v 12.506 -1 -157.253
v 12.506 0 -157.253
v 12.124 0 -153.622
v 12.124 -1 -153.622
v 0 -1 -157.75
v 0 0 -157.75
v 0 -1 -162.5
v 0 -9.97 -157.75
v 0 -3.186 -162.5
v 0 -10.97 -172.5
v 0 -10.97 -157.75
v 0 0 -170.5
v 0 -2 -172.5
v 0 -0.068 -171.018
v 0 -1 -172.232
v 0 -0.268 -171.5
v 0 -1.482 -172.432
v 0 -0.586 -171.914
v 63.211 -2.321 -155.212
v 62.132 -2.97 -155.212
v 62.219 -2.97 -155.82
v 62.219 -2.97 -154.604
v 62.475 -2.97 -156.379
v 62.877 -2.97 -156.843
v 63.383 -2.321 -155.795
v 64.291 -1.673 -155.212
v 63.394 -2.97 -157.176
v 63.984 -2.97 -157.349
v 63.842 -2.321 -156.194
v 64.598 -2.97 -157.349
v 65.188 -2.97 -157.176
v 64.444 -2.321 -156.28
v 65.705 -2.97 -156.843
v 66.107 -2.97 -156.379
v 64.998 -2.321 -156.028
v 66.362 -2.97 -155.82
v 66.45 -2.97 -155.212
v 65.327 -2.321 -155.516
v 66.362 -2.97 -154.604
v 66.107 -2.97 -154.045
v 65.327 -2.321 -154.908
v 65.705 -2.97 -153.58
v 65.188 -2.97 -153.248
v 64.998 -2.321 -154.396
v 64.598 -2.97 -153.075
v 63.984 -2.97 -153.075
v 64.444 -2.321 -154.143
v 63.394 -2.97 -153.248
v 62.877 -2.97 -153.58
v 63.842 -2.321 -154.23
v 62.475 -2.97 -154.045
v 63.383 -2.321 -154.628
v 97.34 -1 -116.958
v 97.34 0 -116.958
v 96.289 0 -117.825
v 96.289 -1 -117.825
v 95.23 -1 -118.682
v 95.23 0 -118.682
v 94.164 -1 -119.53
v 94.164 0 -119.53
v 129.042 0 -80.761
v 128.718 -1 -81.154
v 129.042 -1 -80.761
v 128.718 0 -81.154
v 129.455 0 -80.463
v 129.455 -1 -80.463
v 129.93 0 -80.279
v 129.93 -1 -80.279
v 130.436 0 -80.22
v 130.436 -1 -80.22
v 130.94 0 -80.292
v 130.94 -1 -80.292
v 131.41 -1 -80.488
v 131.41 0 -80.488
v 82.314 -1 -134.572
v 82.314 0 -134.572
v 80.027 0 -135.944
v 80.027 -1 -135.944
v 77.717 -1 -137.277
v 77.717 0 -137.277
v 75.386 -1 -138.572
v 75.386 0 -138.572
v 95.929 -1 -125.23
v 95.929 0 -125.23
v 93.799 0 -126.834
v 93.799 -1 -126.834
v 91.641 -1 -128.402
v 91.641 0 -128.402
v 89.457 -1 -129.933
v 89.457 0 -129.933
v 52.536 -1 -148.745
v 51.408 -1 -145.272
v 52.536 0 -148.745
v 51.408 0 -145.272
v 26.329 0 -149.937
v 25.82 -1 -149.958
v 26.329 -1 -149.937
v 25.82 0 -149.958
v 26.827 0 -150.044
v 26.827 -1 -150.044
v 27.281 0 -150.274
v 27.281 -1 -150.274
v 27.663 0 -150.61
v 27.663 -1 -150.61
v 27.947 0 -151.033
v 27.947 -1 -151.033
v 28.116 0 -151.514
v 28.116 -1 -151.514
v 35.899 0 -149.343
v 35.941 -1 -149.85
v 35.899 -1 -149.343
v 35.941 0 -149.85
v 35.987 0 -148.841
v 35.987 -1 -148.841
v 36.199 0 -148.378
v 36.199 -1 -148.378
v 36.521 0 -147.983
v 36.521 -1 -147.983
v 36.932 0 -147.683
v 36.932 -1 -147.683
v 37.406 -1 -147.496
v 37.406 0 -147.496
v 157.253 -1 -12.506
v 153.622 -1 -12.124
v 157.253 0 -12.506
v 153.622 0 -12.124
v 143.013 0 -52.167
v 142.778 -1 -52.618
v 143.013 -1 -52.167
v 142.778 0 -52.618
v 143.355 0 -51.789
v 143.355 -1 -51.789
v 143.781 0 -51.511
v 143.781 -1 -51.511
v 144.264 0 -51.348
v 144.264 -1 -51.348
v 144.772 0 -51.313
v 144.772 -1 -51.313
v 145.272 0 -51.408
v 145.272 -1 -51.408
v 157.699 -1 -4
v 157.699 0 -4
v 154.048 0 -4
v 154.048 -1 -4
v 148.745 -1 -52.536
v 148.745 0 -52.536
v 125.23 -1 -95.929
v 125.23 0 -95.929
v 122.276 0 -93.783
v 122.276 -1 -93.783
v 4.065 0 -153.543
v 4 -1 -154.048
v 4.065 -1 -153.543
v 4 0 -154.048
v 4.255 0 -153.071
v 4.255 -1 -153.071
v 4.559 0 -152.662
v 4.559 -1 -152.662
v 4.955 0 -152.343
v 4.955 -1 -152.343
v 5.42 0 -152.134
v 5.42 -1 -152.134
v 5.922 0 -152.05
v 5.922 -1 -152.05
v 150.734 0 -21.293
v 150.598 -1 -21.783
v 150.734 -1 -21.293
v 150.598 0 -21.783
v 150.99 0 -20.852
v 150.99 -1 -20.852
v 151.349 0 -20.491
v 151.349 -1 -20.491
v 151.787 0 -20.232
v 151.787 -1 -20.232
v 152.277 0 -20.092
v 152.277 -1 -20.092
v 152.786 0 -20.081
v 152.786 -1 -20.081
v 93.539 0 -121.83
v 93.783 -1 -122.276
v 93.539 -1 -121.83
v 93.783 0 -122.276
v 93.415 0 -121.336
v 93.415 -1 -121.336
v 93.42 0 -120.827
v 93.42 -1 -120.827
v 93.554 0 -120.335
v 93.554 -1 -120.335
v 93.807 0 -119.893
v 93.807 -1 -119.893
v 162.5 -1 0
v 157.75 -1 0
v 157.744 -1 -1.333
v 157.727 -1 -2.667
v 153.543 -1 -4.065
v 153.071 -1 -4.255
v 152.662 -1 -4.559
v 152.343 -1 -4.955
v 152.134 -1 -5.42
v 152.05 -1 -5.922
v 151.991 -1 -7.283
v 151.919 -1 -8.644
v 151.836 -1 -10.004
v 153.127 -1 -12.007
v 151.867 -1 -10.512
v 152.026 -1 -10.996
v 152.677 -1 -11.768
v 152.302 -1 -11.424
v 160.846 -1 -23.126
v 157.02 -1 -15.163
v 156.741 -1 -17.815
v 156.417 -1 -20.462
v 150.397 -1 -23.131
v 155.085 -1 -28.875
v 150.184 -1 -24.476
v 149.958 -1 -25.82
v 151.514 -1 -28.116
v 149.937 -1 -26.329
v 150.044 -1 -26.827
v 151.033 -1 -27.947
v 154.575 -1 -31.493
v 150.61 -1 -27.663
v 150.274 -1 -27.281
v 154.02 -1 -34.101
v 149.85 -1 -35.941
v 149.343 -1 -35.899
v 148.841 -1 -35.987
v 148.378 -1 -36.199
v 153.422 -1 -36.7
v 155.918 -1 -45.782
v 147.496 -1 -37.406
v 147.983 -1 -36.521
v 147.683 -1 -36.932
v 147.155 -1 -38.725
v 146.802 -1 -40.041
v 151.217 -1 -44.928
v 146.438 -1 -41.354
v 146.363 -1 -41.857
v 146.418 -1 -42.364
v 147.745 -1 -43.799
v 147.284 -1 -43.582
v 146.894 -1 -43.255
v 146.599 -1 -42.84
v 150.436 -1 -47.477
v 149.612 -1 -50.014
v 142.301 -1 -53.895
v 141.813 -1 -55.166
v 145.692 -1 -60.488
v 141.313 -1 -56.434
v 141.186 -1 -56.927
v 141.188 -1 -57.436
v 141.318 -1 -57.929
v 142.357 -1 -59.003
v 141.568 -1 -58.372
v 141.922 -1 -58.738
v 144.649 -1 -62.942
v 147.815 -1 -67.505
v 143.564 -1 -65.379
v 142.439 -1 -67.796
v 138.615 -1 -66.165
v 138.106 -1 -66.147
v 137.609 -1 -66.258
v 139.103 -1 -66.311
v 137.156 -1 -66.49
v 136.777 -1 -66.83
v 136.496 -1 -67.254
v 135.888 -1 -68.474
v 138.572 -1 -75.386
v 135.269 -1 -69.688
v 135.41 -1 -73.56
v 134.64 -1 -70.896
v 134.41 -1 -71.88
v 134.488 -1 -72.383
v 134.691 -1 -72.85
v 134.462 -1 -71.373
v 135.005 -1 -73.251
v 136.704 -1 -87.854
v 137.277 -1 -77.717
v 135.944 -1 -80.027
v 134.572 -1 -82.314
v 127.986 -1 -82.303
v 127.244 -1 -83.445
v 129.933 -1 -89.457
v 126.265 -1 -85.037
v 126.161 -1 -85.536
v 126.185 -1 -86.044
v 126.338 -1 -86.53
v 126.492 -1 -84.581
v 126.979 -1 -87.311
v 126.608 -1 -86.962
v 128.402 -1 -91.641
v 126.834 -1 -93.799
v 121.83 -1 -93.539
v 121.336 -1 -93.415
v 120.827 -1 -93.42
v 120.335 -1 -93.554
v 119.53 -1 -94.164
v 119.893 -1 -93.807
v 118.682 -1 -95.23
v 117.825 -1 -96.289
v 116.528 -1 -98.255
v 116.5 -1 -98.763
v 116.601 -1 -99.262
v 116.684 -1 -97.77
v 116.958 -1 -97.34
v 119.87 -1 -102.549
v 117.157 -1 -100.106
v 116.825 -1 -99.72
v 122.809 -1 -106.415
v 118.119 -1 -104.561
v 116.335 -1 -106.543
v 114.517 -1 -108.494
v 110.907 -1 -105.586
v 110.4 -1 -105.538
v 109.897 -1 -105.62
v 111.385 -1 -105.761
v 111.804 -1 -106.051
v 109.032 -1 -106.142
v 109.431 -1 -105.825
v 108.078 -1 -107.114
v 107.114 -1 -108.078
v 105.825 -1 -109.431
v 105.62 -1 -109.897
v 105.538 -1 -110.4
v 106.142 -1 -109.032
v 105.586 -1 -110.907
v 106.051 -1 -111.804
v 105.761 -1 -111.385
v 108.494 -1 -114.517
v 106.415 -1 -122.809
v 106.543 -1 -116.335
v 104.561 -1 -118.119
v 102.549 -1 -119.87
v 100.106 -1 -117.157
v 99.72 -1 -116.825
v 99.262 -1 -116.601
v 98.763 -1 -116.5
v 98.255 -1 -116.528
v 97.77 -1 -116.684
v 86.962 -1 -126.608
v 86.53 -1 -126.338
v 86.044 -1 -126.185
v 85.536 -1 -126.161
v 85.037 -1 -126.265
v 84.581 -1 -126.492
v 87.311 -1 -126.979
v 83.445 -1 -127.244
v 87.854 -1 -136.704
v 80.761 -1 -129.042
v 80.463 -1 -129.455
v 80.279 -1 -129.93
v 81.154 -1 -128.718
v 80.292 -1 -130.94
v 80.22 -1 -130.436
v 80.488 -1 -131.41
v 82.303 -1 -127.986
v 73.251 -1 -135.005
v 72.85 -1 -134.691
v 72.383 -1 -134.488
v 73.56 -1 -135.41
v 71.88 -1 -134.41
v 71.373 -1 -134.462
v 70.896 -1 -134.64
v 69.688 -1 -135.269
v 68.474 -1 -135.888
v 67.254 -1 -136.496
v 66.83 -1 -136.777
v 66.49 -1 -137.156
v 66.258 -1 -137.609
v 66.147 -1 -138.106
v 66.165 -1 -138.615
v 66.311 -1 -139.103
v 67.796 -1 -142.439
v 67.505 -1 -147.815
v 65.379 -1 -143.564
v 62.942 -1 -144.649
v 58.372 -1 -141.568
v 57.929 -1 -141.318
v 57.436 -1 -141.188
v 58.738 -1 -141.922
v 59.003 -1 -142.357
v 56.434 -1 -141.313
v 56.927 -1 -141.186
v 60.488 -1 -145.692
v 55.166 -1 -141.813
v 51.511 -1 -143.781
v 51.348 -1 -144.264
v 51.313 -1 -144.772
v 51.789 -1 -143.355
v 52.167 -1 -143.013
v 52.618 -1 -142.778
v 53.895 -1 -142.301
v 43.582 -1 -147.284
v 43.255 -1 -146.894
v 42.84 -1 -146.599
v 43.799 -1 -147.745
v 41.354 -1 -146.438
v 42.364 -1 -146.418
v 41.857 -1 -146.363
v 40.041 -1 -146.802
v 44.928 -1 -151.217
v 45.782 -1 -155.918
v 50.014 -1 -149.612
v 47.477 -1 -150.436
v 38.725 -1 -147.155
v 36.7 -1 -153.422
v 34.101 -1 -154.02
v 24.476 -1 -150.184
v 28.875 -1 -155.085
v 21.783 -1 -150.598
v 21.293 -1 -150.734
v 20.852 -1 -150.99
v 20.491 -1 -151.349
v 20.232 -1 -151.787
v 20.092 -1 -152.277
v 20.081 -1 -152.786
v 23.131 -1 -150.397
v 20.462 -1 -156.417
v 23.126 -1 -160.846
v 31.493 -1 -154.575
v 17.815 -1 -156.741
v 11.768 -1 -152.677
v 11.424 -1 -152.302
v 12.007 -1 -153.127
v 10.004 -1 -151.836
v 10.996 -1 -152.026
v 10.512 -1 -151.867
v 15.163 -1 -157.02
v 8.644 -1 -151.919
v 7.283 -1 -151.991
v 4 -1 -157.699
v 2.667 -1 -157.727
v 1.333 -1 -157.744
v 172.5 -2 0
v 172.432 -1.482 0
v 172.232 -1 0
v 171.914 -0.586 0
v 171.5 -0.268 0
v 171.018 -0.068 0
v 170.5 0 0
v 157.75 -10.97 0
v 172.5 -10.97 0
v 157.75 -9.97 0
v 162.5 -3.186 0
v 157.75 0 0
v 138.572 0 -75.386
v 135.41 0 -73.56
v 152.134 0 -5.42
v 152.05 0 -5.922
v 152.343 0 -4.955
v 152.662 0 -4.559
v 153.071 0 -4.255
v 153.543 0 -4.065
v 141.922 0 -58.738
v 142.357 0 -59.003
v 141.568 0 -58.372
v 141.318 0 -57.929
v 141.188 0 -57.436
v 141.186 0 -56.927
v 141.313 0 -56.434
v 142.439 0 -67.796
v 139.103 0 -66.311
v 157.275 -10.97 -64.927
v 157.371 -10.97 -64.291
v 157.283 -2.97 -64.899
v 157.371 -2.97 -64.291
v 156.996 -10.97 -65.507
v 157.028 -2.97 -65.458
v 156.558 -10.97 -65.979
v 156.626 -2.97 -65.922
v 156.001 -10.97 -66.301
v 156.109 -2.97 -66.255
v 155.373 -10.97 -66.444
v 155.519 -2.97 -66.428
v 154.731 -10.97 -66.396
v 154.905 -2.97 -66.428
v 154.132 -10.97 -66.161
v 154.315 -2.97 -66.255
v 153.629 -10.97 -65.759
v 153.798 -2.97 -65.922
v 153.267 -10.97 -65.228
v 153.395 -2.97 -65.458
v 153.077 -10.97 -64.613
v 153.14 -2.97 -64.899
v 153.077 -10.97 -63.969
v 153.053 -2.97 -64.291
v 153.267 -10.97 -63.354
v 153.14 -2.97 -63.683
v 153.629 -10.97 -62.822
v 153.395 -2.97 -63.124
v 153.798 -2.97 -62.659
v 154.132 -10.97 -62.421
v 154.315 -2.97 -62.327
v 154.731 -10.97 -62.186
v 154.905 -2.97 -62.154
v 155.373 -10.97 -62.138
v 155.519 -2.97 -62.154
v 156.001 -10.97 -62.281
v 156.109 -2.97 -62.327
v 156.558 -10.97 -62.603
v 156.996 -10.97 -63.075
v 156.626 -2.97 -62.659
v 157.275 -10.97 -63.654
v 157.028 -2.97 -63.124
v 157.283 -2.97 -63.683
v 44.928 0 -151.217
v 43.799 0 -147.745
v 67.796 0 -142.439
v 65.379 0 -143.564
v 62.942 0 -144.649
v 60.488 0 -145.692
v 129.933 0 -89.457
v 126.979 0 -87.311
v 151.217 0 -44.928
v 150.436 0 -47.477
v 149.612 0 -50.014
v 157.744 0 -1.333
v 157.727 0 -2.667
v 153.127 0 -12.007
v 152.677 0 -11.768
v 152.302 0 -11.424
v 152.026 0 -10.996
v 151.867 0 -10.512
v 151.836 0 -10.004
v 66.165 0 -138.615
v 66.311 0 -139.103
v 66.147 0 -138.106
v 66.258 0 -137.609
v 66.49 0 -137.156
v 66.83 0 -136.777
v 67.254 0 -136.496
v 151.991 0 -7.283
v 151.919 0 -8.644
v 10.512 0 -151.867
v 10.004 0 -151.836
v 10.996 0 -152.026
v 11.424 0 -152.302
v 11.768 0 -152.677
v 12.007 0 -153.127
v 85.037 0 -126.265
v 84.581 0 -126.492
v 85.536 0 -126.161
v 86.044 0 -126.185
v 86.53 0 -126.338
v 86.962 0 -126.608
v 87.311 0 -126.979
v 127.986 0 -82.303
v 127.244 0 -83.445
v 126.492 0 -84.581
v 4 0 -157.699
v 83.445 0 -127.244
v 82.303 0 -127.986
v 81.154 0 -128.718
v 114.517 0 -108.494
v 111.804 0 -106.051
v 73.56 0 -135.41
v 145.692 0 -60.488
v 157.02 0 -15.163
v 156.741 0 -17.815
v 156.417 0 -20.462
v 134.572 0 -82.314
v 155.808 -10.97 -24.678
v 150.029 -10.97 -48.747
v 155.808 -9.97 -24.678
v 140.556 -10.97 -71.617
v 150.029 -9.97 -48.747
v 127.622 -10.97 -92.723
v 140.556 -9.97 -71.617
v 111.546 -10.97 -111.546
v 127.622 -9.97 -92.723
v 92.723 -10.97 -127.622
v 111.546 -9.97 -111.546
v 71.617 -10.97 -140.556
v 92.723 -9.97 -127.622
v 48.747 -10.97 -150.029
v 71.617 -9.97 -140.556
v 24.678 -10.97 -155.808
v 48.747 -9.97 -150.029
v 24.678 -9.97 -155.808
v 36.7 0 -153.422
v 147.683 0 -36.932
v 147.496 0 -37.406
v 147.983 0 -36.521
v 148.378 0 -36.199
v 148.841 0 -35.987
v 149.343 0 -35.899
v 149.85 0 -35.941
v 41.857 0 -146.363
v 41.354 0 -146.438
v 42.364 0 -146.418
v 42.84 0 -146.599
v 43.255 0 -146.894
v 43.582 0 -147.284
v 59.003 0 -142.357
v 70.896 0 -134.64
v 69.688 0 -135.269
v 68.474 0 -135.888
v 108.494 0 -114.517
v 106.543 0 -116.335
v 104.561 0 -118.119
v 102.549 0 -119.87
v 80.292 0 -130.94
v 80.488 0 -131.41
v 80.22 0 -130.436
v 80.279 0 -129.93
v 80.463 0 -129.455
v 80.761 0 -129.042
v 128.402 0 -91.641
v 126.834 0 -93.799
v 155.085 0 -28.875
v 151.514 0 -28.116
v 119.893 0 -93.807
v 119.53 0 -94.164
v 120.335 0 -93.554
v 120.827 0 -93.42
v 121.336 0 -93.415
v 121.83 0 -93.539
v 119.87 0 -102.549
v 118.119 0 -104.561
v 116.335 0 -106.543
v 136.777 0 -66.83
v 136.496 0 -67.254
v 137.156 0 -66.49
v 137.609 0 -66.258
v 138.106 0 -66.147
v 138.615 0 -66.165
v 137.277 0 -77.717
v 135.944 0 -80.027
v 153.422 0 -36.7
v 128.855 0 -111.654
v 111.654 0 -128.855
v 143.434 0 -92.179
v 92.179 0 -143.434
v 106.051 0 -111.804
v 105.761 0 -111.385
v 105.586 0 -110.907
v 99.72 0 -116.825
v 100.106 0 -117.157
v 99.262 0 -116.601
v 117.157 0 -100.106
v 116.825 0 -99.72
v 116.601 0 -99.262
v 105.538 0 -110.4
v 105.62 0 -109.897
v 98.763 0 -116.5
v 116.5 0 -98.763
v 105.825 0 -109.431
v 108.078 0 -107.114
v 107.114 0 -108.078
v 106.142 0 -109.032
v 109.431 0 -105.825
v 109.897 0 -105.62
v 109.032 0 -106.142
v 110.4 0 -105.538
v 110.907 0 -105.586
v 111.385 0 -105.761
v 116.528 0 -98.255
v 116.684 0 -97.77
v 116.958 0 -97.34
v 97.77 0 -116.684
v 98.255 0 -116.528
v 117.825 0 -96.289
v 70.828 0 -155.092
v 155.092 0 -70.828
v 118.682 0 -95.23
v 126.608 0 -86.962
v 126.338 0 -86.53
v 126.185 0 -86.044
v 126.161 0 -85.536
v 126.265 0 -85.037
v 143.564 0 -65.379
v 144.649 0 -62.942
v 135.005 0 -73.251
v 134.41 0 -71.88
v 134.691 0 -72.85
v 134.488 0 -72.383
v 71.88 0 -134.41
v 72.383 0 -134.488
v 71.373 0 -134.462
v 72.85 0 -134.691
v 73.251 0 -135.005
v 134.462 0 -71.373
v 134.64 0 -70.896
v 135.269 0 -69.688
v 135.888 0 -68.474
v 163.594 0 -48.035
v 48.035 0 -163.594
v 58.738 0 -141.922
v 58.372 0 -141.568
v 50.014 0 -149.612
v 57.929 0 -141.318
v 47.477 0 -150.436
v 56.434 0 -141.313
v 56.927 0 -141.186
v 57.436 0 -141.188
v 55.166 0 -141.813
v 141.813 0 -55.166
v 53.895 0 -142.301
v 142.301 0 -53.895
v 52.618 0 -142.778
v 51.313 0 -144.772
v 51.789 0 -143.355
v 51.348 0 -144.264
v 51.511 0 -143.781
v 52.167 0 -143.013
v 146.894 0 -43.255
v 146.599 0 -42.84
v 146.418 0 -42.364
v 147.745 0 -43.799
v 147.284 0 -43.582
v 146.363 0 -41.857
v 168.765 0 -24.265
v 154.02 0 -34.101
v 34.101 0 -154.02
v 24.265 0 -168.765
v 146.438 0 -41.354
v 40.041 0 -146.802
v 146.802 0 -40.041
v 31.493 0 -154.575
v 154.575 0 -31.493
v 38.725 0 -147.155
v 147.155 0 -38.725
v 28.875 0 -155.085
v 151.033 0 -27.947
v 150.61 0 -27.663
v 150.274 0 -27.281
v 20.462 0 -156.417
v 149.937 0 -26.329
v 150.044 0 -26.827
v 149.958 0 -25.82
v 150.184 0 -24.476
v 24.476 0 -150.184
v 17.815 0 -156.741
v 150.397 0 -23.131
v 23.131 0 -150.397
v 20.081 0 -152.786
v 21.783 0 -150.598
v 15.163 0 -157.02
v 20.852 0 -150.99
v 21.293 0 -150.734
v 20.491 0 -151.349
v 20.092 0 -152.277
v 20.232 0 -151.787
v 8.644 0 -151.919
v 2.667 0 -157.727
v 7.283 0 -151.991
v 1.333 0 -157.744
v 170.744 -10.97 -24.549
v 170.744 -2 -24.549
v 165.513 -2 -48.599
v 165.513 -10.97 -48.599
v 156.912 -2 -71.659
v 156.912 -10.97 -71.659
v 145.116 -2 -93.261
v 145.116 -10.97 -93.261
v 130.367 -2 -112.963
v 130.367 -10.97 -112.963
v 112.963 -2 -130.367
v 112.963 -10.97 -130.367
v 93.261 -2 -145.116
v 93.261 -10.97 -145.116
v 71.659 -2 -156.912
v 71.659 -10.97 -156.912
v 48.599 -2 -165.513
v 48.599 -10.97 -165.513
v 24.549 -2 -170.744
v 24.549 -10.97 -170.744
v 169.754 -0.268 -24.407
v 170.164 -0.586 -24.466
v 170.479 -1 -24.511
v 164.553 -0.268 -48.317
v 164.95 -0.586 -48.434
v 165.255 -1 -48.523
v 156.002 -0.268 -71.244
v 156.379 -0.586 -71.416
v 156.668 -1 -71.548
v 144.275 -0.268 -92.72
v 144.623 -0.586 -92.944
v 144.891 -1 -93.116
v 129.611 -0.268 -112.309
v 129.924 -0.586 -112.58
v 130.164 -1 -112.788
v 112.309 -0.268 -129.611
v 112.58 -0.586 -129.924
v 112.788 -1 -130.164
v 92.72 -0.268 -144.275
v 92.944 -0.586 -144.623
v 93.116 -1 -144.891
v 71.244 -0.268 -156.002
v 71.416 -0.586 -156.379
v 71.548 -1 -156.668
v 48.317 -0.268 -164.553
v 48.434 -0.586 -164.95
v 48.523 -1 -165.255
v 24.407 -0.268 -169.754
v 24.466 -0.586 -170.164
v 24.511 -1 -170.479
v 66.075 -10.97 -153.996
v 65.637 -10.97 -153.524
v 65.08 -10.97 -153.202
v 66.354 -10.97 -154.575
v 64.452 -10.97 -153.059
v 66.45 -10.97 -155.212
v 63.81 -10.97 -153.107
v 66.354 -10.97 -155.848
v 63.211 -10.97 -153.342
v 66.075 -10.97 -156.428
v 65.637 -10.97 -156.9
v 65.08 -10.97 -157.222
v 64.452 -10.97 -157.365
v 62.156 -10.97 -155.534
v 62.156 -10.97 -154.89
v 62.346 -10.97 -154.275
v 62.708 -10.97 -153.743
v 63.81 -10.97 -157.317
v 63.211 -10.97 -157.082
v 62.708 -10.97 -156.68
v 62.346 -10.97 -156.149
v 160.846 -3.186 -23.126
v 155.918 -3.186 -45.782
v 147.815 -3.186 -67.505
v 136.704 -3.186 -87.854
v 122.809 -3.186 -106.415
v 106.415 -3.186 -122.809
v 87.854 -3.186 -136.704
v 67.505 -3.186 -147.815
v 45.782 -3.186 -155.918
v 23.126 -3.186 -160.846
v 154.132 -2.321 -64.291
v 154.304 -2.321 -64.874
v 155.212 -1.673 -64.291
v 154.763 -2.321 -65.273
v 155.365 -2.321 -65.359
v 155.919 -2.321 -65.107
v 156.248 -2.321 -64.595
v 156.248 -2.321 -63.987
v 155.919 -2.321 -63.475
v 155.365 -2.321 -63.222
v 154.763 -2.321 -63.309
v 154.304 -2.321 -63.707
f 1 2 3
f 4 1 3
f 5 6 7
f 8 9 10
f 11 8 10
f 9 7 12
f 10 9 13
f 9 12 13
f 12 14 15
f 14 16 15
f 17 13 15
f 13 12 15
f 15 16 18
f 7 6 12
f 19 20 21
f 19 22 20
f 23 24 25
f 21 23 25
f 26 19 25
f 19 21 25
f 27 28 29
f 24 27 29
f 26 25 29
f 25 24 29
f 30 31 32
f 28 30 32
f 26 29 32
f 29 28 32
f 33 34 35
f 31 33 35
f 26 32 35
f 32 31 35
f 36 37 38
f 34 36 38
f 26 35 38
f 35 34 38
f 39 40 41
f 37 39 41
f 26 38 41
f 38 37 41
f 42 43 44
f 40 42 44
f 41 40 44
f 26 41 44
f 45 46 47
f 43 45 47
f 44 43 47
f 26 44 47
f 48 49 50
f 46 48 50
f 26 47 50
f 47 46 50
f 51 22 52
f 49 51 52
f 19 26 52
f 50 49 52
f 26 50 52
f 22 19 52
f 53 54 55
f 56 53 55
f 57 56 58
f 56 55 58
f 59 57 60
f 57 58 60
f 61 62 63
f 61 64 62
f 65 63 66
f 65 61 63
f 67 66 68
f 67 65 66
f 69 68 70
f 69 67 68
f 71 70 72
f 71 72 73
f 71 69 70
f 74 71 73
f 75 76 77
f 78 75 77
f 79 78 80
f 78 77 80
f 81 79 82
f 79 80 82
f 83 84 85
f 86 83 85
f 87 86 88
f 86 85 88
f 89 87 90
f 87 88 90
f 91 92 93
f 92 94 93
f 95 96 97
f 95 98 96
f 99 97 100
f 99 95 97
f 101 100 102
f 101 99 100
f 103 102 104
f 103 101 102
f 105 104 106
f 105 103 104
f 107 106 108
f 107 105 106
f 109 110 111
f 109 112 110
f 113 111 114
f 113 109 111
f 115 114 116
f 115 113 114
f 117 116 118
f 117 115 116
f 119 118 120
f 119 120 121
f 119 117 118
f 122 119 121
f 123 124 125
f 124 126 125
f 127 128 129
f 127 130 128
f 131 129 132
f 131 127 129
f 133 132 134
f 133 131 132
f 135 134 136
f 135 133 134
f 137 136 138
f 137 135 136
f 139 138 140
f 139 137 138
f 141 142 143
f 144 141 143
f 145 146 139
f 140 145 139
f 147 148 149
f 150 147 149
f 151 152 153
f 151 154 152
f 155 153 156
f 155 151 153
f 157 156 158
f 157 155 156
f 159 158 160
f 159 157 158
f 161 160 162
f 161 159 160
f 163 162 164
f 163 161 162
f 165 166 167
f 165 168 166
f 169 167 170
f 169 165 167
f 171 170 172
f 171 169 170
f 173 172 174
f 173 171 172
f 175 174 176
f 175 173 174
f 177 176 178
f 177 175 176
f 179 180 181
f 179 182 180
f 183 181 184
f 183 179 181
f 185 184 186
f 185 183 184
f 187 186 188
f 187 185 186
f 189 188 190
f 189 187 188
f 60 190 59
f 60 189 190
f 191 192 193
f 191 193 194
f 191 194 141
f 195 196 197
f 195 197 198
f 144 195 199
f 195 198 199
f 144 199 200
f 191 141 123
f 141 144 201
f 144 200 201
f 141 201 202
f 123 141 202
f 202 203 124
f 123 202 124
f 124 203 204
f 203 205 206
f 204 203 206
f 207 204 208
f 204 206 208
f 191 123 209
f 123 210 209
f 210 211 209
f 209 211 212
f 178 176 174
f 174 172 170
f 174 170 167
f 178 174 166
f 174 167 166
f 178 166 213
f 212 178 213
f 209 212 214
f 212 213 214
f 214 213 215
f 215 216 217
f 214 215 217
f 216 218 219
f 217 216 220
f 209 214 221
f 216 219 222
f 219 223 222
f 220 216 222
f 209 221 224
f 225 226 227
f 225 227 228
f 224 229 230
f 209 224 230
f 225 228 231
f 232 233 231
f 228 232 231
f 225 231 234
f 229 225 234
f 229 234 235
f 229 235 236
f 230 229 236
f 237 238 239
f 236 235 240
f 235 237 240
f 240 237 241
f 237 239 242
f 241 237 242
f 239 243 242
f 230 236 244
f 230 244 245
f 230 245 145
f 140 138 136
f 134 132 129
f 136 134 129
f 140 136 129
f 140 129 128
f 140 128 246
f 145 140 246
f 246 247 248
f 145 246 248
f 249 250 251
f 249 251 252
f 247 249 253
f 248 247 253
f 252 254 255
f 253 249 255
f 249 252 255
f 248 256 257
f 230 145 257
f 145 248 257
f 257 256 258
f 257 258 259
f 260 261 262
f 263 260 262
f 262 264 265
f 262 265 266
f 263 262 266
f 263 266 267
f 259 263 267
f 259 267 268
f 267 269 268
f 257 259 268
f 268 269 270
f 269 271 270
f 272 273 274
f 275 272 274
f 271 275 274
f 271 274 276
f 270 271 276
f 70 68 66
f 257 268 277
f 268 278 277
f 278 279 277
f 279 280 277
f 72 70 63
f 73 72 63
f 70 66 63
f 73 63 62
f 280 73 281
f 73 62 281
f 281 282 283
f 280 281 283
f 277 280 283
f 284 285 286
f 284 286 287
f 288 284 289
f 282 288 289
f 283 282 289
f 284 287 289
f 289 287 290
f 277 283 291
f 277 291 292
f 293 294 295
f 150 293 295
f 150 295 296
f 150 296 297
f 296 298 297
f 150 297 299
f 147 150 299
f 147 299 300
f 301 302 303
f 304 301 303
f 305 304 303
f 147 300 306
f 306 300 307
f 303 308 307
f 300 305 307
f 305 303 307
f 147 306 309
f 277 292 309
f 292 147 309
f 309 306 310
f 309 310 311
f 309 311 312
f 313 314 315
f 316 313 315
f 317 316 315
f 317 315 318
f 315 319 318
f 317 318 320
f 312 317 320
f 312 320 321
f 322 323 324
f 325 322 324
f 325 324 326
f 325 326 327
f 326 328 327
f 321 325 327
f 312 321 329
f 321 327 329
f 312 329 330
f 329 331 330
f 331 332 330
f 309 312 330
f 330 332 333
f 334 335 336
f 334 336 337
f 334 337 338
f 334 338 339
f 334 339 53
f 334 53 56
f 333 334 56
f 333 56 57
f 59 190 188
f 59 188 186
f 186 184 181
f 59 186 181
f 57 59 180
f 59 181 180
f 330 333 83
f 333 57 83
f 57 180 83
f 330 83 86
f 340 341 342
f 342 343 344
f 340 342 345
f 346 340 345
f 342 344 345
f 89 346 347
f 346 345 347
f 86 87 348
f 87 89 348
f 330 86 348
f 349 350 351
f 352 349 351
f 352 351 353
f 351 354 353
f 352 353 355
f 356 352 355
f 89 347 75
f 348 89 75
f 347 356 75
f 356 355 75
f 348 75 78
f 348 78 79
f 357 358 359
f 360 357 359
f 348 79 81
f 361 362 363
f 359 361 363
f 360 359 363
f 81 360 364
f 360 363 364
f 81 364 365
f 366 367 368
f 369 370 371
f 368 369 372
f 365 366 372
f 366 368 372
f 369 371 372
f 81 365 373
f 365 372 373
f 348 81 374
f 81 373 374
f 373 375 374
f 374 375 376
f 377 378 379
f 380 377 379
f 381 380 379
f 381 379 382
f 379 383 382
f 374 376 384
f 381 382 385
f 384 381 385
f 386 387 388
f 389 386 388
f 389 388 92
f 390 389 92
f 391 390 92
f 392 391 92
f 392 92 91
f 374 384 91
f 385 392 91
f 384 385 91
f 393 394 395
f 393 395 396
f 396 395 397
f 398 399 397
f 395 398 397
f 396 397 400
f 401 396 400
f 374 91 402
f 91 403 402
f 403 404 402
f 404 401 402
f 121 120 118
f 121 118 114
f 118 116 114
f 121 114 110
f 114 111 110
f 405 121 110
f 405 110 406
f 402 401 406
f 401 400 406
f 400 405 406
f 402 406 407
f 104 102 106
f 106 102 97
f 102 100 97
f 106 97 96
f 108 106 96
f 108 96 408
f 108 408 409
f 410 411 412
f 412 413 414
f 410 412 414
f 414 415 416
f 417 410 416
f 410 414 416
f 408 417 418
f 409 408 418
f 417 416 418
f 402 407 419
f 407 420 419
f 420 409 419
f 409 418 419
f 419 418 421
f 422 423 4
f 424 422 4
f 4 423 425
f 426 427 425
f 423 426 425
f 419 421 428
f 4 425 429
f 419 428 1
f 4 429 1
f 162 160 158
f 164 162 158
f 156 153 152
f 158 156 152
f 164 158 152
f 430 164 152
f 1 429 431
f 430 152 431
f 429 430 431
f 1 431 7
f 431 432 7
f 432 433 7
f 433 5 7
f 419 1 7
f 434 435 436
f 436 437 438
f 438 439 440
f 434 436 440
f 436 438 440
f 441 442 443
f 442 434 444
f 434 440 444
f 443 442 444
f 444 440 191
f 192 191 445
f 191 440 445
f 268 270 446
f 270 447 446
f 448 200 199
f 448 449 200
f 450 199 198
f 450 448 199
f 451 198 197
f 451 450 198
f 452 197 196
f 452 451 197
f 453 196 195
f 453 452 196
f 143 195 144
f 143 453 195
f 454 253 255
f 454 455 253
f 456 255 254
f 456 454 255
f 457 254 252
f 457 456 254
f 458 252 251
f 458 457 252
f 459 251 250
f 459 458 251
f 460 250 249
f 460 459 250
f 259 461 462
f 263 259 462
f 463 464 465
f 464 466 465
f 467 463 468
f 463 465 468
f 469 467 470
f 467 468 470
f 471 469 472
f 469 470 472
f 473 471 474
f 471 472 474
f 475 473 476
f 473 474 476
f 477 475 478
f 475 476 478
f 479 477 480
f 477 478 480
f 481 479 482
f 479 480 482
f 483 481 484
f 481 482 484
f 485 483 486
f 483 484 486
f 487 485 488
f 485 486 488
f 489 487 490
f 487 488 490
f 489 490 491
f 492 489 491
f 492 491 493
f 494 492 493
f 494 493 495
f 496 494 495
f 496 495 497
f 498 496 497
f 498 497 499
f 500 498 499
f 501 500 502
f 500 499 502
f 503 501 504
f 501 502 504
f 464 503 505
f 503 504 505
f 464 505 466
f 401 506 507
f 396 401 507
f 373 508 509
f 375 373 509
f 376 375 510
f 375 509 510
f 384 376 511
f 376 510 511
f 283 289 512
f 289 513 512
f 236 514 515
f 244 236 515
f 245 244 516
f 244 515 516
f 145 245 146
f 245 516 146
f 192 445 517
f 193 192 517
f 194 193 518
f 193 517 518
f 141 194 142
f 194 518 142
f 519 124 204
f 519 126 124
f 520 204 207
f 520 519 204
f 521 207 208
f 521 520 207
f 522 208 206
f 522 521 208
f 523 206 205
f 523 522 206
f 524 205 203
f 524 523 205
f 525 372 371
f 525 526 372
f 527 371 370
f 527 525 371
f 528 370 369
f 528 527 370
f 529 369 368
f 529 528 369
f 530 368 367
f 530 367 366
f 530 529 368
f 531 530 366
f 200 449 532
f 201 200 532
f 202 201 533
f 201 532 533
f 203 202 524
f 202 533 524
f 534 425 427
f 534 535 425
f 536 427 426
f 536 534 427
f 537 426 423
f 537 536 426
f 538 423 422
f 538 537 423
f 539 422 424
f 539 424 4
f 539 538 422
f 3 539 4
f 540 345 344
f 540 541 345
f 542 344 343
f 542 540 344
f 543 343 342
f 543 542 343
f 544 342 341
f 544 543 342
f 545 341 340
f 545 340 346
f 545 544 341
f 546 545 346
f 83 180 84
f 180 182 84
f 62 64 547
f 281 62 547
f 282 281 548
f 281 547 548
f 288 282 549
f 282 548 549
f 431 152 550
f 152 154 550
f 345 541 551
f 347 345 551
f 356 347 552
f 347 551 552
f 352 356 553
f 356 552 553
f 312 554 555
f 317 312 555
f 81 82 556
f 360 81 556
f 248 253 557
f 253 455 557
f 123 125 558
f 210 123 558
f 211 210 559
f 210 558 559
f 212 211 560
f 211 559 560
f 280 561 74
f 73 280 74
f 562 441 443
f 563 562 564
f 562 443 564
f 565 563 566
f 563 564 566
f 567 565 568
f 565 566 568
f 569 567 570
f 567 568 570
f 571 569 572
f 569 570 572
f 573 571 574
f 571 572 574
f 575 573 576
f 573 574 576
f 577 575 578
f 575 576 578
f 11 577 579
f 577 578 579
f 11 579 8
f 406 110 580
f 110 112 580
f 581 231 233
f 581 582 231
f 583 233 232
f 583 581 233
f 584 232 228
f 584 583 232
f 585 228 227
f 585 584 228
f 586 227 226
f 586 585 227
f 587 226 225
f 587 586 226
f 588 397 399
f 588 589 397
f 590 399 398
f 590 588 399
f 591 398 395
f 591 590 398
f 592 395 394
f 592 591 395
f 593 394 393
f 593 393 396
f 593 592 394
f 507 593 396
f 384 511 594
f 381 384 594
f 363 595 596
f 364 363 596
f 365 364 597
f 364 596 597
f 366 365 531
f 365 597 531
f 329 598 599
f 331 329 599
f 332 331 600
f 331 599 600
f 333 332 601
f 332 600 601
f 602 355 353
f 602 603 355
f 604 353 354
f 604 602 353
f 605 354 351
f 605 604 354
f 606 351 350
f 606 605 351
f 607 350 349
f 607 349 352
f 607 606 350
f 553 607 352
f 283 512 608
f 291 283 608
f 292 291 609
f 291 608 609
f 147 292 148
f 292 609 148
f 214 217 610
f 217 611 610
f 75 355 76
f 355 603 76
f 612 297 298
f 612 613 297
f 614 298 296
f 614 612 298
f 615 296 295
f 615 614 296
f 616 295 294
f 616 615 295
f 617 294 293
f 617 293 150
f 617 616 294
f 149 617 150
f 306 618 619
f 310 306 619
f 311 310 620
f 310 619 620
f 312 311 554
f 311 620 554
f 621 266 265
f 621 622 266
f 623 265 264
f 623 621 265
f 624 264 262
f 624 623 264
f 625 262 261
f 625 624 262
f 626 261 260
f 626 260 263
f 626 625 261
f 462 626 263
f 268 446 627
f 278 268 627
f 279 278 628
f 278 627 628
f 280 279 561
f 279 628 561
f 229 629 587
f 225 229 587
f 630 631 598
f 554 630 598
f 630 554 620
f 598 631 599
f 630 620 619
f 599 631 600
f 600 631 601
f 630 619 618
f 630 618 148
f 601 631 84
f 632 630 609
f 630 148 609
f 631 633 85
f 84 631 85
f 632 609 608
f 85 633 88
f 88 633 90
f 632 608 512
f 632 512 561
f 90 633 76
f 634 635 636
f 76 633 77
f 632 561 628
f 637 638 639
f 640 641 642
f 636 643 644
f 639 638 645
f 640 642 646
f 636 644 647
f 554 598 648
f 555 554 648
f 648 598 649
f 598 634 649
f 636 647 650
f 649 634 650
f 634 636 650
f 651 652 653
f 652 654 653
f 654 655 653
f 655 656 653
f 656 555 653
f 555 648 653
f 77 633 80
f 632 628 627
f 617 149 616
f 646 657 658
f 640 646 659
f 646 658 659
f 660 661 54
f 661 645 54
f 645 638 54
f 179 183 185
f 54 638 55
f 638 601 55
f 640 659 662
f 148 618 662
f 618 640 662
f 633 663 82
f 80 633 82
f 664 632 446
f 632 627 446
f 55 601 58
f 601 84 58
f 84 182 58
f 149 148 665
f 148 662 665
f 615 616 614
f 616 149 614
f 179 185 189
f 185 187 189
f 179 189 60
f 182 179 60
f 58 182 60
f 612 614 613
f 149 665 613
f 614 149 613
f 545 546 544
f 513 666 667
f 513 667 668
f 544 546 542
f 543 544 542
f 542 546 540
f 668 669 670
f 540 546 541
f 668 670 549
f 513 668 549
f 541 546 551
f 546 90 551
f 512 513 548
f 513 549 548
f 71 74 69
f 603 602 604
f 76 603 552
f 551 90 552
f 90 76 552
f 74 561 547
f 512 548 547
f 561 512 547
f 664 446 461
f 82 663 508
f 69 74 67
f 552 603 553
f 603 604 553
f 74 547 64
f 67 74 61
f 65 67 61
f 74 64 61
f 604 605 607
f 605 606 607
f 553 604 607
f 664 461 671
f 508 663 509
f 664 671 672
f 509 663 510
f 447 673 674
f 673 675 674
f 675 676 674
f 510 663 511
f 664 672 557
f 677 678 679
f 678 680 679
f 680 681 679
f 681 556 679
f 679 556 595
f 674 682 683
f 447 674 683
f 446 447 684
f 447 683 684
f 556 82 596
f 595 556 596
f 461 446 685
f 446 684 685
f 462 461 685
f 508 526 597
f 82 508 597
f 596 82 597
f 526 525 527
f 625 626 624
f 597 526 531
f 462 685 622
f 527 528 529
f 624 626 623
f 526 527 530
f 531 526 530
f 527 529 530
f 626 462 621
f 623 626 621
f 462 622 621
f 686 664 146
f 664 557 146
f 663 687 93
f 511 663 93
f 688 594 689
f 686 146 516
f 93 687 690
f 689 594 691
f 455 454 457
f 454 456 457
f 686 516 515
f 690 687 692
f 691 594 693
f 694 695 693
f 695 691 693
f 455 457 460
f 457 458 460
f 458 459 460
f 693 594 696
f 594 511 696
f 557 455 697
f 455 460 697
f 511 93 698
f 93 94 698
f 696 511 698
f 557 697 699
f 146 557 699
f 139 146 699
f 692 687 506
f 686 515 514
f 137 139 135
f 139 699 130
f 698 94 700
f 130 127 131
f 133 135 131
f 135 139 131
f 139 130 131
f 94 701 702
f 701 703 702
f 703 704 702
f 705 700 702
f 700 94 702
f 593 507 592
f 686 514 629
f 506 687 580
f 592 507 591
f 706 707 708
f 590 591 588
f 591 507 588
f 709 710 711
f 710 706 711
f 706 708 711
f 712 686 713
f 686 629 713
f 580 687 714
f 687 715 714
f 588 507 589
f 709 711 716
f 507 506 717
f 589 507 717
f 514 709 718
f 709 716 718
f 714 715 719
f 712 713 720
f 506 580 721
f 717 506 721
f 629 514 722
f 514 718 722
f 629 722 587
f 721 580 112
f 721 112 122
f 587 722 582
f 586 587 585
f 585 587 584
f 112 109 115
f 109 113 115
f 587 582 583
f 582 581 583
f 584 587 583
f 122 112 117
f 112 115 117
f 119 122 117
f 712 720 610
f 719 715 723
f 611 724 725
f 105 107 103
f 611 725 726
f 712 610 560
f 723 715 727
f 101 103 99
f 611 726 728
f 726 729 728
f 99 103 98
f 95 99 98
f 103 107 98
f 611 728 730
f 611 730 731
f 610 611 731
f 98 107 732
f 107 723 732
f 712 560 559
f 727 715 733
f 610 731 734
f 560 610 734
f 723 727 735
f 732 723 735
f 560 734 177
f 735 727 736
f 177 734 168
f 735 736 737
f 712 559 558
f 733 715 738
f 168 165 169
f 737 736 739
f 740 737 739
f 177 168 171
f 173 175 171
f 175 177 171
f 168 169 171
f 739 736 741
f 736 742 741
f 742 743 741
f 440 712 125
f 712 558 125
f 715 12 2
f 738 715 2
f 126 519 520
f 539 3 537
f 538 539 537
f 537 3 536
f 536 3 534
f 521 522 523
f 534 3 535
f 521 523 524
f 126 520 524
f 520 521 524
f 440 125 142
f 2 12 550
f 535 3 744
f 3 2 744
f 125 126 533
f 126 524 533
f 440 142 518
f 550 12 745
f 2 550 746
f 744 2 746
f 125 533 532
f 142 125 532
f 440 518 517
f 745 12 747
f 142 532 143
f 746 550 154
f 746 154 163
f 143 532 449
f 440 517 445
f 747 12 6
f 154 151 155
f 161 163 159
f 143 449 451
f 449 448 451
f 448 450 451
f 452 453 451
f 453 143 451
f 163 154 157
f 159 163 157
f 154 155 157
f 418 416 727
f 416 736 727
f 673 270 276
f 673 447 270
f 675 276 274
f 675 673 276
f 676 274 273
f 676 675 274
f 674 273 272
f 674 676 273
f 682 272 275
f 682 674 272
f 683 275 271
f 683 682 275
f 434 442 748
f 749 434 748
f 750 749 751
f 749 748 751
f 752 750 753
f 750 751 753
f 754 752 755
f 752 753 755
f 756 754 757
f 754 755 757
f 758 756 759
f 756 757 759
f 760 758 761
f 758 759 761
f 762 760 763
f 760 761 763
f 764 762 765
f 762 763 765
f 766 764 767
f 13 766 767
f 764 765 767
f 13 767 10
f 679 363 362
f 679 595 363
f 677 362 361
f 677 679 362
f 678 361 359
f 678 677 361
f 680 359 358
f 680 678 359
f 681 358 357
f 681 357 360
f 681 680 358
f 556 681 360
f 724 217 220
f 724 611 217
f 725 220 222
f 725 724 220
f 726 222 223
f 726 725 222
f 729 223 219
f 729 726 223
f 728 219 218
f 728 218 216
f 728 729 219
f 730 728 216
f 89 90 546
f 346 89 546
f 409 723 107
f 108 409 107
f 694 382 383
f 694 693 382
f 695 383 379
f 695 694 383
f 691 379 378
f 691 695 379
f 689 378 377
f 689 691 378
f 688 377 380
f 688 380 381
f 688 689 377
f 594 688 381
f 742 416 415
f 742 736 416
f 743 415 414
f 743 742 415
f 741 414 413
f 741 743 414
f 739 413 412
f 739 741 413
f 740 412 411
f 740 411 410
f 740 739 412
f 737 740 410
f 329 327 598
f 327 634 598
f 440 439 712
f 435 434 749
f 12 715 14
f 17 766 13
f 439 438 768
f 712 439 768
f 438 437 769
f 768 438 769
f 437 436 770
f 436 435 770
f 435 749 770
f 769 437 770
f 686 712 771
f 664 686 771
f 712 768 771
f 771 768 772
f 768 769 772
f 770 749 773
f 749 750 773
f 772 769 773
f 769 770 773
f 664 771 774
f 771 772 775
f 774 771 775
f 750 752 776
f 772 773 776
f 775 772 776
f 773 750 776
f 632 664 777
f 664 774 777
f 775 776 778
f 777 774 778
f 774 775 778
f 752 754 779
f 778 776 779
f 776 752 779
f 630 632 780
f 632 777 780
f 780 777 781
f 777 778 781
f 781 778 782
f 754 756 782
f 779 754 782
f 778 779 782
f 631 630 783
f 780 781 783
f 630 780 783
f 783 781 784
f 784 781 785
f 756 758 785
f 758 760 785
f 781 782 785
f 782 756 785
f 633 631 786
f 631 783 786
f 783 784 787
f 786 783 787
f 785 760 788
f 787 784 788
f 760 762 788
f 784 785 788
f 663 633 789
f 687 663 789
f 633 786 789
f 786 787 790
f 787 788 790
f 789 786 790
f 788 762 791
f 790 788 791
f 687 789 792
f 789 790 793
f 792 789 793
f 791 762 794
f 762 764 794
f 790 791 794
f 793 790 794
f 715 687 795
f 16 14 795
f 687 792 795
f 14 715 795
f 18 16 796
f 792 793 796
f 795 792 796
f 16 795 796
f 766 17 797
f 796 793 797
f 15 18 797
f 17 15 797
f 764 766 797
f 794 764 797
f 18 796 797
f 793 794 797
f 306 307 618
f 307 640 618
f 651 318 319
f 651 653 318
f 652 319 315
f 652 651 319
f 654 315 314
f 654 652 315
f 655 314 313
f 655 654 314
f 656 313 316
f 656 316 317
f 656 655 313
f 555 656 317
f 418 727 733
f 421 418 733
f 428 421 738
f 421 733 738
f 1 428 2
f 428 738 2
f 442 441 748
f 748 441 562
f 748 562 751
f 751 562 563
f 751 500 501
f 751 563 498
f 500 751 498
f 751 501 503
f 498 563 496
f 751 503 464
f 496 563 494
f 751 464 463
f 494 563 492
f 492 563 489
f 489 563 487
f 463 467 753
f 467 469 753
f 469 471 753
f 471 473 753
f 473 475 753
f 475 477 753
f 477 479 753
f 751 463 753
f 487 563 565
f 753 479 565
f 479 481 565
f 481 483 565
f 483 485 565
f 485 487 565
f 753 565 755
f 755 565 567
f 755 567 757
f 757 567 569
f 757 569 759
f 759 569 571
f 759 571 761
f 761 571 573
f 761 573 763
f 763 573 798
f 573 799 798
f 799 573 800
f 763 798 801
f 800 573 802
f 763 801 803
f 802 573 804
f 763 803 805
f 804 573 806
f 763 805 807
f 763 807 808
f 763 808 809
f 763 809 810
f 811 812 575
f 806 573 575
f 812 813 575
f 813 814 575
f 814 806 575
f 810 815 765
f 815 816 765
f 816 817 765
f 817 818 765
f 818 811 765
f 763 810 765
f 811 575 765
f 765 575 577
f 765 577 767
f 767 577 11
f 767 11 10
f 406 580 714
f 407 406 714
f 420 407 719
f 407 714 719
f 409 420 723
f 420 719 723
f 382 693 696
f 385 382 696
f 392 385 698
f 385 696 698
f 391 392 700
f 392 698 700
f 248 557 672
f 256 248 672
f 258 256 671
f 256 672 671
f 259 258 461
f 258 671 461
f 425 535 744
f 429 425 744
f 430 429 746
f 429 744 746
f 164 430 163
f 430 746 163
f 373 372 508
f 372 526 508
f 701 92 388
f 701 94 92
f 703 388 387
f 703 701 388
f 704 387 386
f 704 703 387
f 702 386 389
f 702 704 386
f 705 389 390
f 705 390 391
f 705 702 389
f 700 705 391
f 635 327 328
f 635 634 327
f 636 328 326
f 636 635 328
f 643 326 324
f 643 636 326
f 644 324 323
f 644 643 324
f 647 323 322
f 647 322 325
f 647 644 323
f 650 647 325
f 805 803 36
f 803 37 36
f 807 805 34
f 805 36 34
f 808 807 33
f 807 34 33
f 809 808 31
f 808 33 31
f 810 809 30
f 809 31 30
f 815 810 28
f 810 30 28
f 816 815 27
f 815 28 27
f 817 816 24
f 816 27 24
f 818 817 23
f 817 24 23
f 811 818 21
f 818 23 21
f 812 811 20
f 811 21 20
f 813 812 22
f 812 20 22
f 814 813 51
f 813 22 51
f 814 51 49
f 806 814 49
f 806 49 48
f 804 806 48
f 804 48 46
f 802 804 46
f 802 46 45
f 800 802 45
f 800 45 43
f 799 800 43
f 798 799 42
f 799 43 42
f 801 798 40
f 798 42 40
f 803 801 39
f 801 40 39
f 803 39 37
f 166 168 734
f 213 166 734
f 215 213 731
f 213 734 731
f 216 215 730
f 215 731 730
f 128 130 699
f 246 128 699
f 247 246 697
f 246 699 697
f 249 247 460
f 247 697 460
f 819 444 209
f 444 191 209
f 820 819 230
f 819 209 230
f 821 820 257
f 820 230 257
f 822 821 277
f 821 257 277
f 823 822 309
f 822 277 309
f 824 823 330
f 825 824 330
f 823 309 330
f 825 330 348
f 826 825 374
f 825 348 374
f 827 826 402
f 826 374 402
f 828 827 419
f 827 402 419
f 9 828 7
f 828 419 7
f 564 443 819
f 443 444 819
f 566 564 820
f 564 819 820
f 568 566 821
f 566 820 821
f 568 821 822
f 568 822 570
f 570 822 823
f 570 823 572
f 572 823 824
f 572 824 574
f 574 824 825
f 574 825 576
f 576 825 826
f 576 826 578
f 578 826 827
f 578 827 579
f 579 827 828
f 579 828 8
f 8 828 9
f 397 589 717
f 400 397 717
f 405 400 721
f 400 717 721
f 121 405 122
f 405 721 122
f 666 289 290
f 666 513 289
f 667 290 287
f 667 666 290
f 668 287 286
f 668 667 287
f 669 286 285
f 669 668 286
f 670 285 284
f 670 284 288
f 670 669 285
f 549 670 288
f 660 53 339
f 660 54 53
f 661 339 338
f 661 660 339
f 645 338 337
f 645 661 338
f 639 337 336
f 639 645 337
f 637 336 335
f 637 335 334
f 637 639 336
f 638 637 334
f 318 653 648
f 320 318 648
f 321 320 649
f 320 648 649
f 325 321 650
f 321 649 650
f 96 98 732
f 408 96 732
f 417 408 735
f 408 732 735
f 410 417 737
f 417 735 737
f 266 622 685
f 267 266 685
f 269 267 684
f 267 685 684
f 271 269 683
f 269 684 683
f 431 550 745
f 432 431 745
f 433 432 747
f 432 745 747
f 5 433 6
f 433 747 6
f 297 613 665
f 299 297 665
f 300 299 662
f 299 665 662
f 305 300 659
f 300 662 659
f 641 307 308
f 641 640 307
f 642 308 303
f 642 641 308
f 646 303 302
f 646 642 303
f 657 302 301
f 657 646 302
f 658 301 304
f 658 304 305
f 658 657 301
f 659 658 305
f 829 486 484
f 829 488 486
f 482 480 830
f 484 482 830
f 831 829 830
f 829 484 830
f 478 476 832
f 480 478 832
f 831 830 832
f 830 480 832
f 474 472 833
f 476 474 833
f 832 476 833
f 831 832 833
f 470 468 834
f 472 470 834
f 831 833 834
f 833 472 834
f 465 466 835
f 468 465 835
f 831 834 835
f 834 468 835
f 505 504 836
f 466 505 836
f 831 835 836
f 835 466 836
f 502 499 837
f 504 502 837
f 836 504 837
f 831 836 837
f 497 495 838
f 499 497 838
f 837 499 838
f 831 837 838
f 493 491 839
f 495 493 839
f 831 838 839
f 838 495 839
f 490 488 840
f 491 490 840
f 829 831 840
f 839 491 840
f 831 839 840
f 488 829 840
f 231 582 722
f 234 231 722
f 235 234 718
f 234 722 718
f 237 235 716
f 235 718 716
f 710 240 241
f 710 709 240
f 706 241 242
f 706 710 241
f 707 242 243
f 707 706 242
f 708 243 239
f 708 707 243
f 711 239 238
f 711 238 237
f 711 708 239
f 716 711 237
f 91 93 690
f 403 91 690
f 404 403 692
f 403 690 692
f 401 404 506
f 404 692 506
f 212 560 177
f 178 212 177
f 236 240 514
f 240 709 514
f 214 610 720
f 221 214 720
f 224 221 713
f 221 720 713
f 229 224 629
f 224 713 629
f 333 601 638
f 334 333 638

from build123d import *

# Parameters (mm, degrees)
CUT_EXTRUDE1_DEPTH             = 245.198363836
CIRPATTERN1_COUNT              = 60
CUT_EXTRUDE2_DEPTH             = 25.4
FILLET1_R                      = 2
F_6_0_204_DIAMETER_HOLE1_D     = 4.318
F_6_0_204_DIAMETER_HOLE1_DEPTH = 8
F_6_0_204_DIAMETER_HOLE1_TIP   = 1.297258076
FILLET2_R                      = 2


with BuildPart() as part:
    # Sketch1 → Revolve1 (revolve)
    with BuildSketch(Plane.XY, mode=Mode.PRIVATE) as revolve1_sk:
        Polygon((-157.75, -10.97), (-157.75, -9.97), (-162.5, -3.186296968), (-162.5, -1), (-152.165, -1), (-152.165, 0), (-172.5, 0), (-172.5, -10.97), align=None)
    revolve(revolve1_sk.sketch.rotate(Axis((0, 0, 0), (0, 1, 0)), 270), axis=Axis((0, 0, 0), (0, 1, 0)))

    # Sketch2 → Cut-Extrude1 (cut, symmetric)
    with BuildSketch(Plane(origin=(0, 0, 0), x_dir=(1, 0, 0), z_dir=(0, 1, 0))):
        with BuildLine():
            Line((-4, 150.699278692), (4, 150.699278692))
            Line((4, 150.699278692), (4, 157.699278692))
            ThreePointArc((4, 157.699278692), (0, 157.75), (-4, 157.699278692))
            Line((-4, 157.699278692), (-4, 150.699278692))
        make_face()
    cut_extrude1 = extrude(amount=CUT_EXTRUDE1_DEPTH, both=True, mode=Mode.SUBTRACT)

    # CirPattern1: Cut-Extrude1 ×60 about axis
    cirpattern1_axis = Axis((0, 0, 0), (0, 1, 0))
    for i in range(1, CIRPATTERN1_COUNT):
        add(cut_extrude1.rotate(cirpattern1_axis, i * 360 / CIRPATTERN1_COUNT), mode=Mode.SUBTRACT)

    # Sketch6 → Cut-Extrude2 (cut, symmetric)
    with BuildSketch(Plane(origin=(0, 0, 0), x_dir=(1, 0, 0), z_dir=(0, 1, 0))):
        with BuildLine():
            Line((0, 0), (0, 216.30546713))
            ThreePointArc((0, 216.30546713), (-152.951062615, -152.951062615), (216.30546713, 0))
            Line((216.30546713, 0), (0, 0))
        make_face()
    extrude(amount=CUT_EXTRUDE2_DEPTH, both=True, mode=Mode.SUBTRACT)

    # Fillet1
    fillet1_edges = [part.edges().sort_by_distance(p)[0] for p in [
        (4, -0.5, -152.112416406),
        (11.921989549, -0.5, -151.697242527),
        (27.713359286, -0.5, -149.620041913),
        (35.538540092, -0.5, -147.956748386),
        (43.20109566, -0.5, -145.90357281),
        (19.878164712, -0.5, -150.86101482),
        (50.80954779, -0.5, -143.431436855),
        (58.215511789, -0.5, -140.588553631),
        (65.52387545, -0.5, -137.334660487),
        (72.592106588, -0.5, -133.733216839),
        (79.520309818, -0.5, -129.733216839),
        (86.173367077, -0.5, -125.412670937),
        (92.645503032, -0.5, -120.710388919),
        (98.810494123, -0.5, -115.718077569),
        (104.755652727, -0.5, -110.365032718),
        (110.365032718, -0.5, -104.755652727),
        (115.718077569, -0.5, -98.810494123),
        (120.710388919, -0.5, -92.645503032),
        (125.412670937, -0.5, -86.173367077),
        (129.733216839, -0.5, -79.520309818),
        (133.733216839, -0.5, -72.592106588),
        (137.334660487, -0.5, -65.52387545),
        (140.588553631, -0.5, -58.215511789),
        (143.431436855, -0.5, -50.80954779),
        (145.90357281, -0.5, -43.20109566),
        (147.956748386, -0.5, -35.538540092),
        (149.620041913, -0.5, -27.713359286),
        (150.86101482, -0.5, -19.878164712),
        (151.697242527, -0.5, -11.921989549),
        (152.112416406, -0.5, -4),
    ]]
    fillet(fillet1_edges, radius=FILLET1_R)

    # #6 (0.204) Diameter Hole1
    with Locations(Plane(origin=(0, -10.97, 0), x_dir=(-1, 0, 0), z_dir=(0, -1, 0))):
        with Locations((-64.290816637, 155.211761462), (-155.211761462, 64.290816637)):
            Hole(F_6_0_204_DIAMETER_HOLE1_D / 2, depth=F_6_0_204_DIAMETER_HOLE1_DEPTH)
            with Locations((0, 0, -(F_6_0_204_DIAMETER_HOLE1_DEPTH + F_6_0_204_DIAMETER_HOLE1_TIP / 2))):  # 118° drill point
                Cone(0, F_6_0_204_DIAMETER_HOLE1_D / 2, F_6_0_204_DIAMETER_HOLE1_TIP, mode=Mode.SUBTRACT)

    # Fillet2
    fillet2_edges = [part.edges().sort_by_distance(p)[0] for p in [
        (121.975919755, 0, -121.975919755),
    ]]
    fillet(fillet2_edges, radius=FILLET2_R)


solid = part.part
